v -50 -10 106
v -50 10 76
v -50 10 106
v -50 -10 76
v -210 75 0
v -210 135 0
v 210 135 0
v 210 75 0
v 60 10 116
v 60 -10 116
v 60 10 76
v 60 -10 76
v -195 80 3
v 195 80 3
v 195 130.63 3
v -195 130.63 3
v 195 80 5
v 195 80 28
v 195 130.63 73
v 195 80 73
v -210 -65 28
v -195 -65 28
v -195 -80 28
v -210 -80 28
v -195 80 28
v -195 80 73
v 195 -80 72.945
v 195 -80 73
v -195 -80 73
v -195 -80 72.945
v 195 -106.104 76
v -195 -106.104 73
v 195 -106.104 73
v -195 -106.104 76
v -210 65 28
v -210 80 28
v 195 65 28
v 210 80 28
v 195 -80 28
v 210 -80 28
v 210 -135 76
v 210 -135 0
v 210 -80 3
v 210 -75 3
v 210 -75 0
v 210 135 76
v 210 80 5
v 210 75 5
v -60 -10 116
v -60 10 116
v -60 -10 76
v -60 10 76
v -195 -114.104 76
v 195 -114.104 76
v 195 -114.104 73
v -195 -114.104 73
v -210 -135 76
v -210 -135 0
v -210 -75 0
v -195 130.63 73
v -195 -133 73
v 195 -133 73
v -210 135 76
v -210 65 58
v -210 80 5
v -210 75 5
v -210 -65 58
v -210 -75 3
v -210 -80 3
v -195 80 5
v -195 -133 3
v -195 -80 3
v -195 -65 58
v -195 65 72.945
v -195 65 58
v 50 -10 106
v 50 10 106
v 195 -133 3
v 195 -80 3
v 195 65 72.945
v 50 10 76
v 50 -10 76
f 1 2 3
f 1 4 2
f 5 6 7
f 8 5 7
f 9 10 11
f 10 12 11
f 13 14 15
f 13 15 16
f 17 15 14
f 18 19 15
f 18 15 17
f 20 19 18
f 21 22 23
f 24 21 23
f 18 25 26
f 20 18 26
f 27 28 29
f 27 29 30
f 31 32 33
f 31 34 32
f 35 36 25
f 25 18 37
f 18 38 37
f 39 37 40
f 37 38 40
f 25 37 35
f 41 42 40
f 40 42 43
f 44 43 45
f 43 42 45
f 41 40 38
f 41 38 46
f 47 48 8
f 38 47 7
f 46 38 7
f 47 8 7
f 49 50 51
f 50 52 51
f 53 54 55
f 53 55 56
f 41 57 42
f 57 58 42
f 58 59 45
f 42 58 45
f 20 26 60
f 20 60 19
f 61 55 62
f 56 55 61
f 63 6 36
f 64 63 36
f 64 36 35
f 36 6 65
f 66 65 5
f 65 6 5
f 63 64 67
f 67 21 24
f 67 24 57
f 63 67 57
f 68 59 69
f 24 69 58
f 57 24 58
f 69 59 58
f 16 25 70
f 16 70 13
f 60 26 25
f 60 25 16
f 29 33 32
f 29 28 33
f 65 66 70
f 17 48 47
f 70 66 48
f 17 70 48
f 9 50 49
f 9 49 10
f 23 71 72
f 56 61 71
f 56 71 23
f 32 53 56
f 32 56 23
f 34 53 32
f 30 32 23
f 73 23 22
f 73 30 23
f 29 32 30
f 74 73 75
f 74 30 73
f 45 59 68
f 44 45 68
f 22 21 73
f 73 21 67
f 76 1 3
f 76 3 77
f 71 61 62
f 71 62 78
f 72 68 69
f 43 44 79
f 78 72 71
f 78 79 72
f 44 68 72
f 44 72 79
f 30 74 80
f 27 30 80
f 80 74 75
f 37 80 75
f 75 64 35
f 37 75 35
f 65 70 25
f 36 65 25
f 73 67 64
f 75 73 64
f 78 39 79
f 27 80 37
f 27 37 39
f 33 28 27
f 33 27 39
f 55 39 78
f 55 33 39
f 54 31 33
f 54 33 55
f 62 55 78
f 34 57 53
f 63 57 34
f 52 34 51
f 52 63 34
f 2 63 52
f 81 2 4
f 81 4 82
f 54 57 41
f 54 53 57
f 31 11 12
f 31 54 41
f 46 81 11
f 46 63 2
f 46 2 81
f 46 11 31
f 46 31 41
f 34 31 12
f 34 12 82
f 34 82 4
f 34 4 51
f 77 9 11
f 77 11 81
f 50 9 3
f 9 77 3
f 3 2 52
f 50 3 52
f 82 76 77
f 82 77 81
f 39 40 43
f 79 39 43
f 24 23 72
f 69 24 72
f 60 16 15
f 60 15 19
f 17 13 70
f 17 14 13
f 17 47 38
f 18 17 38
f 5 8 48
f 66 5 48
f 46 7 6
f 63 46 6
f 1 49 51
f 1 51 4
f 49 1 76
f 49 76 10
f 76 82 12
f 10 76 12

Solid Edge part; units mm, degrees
sketch "Sketch1" plane through (0, 0, 0) normal (0, 0, 1) x (1, 0, 0)
  line L0 (-210, -135) -> (210, -135)
  line L1 (210, -135) -> (210, 135)
  line L2 (210, 135) -> (-210, 135)
  line L3 (-210, 135) -> (-210, -135)
extrude "Protrusion1" add sketch "Sketch1" along normal blind 76
sketch "Sketch2" plane through (0, 0, 0) normal (0, 0, -1) x (1, 0, 0)
  line L0 (-195, 80) -> (195, 80)
  line L1 (195, 80) -> (195, -80)
  line L2 (195, -80) -> (-195, -80)
  line L3 (-195, -80) -> (-195, 80)
extrude "ExtrudedCutout_1" cut sketch "Sketch2" against normal blind 70
sketch "Sketch3" plane through (0, -80, 35) normal (0, 1, 0) x (-1, 0, 0)
  line L0 (195, -32) -> (-195, -32)
  line L1 (-195, -32) -> (-195, 38)
  line L2 (-195, 38) -> (195, 38)
  line L3 (195, 38) -> (195, -32)
extrude "ExtrudedCutout_2" cut sketch "Sketch3" against normal blind 53
sketch "Sketch4" plane through (210, 0, 38) normal (1, 0, 0) x (0, 1, 0)
  line L0 (80, -10) -> (-80, -10)
  line L1 (-80, -10) -> (-80, -38)
  line L2 (-80, -38) -> (80, -38)
  line L3 (80, -38) -> (80, -10)
extrude "Cutout1" cut sketch "Sketch4" against normal through all
sketch "Sketch5" plane through (0, 0, 70) normal (0, 0, -1) x (0, 1, 0)
  line L0 (80, -195) -> (-80, -195)
  line L1 (-80, -195) -> (-80, 195)
  line L2 (-80, 195) -> (80, 195)
  line L3 (80, 195) -> (80, -195)
extrude "ExtrudedCutout_5" cut sketch "Sketch5" against normal blind 2.5929
sketch "Sketch6" plane through (0, 0, 70) normal (0, 0, -1) x (0, 1, 0)
  line L0 (80, -195) -> (-80, -195)
  line L1 (-80, -195) -> (-80, 195)
  line L2 (-80, 195) -> (80, 195)
  line L3 (80, 195) -> (80, -195)
extrude "ExtrudedCutout_6" cut sketch "Sketch6" against normal blind 2.9454
sketch "Sketch7" plane through (0, 0, 76) normal (0, 0, 1) x (1, 0, 0)
  line L0 (-60, -10) -> (60, -10)
  line L1 (60, -10) -> (60, 10)
  line L2 (60, 10) -> (-60, 10)
  line L3 (-60, 10) -> (-60, -10)
extrude "ExtrudedProtrusion_2" add sketch "Sketch7" along normal blind 40
sketch "Sketch8" plane through (0, -10, 96) normal (0, -1, 0) x (1, 0, 0)
  line L0 (-50, 10) -> (50, 10)
  line L1 (50, 10) -> (50, -20)
  line L2 (50, -20) -> (-50, -20)
  line L3 (-50, -20) -> (-50, 10)
extrude "Cutout2" cut sketch "Sketch8" against normal up to next
sketch "Sketch9" plane through (0, 0, 76) normal (0, 0, 1) x (1, 0, 0)
  line L0 (195, -114.1043) -> (-195, -114.1043)
  line L1 (-195, -114.1043) -> (-195, -106.1043)
  line L2 (-195, -106.1043) -> (195, -106.1043)
  line L3 (195, -106.1043) -> (195, -114.1043)
extrude "Cutout3" cut sketch "Sketch9" against normal up to next
sketch "Sketch10" plane through (210, 0, 38) normal (1, 0, 0) x (0, 1, 0)
  line L0 (-75, -38) -> (-75, -35)
  line L1 (-75, -35) -> (-80, -35)
  line L2 (-80, -35) -> (-80, -38)
  line L3 (-80, -38) -> (-75, -38)
  line L4 (75, -38) -> (75, -33)
  line L5 (75, -33) -> (80, -33)
  line L6 (80, -33) -> (80, -38)
  line L7 (80, -38) -> (75, -38)
extrude "ExtrudedProtrusion_3" add sketch "Sketch10" against normal blind 420
sketch "Sketch11" plane through (0, 80, 38.9727) normal (0, -1, 0) x (1, 0, 0)
  line L0 (195, 34.0273) -> (195, -35.9727)
  line L1 (195, -35.9727) -> (-195, -35.9727)
  line L2 (-195, -35.9727) -> (-195, 34.0273)
  line L3 (-195, 34.0273) -> (195, 34.0273)
extrude "Cutout4" cut sketch "Sketch11" against normal blind 50.6298
sketch "Sketch12" plane through (-210, 0, 38) normal (-1, 0, 0) x (0, -1, 0)
  line L0 (65, 20) -> (-65, 20)
  line L1 (-65, 20) -> (-65, -10)
  line L2 (-65, -10) -> (65, -10)
  line L3 (65, -10) -> (65, 20)
extrude "Cutout5" cut sketch "Sketch12" against normal up to next
sketch "Sketch13" plane through (-195, -1.1851, 39.5) normal (1, 0, 0) x (0, 1, 0)
  line L0 (66.1851, 36.5) -> (66.1851, -11.5)
  line L1 (66.1851, -11.5) -> (81.1851, -11.5)
  line L2 (81.1851, -11.5) -> (81.1851, 36.5)
  line L3 (81.1851, 36.5) -> (66.1851, 36.5)
extrude "Protrusion2" add sketch "Sketch13" along normal blind 400.6236
properties material "Polycarbonate"
